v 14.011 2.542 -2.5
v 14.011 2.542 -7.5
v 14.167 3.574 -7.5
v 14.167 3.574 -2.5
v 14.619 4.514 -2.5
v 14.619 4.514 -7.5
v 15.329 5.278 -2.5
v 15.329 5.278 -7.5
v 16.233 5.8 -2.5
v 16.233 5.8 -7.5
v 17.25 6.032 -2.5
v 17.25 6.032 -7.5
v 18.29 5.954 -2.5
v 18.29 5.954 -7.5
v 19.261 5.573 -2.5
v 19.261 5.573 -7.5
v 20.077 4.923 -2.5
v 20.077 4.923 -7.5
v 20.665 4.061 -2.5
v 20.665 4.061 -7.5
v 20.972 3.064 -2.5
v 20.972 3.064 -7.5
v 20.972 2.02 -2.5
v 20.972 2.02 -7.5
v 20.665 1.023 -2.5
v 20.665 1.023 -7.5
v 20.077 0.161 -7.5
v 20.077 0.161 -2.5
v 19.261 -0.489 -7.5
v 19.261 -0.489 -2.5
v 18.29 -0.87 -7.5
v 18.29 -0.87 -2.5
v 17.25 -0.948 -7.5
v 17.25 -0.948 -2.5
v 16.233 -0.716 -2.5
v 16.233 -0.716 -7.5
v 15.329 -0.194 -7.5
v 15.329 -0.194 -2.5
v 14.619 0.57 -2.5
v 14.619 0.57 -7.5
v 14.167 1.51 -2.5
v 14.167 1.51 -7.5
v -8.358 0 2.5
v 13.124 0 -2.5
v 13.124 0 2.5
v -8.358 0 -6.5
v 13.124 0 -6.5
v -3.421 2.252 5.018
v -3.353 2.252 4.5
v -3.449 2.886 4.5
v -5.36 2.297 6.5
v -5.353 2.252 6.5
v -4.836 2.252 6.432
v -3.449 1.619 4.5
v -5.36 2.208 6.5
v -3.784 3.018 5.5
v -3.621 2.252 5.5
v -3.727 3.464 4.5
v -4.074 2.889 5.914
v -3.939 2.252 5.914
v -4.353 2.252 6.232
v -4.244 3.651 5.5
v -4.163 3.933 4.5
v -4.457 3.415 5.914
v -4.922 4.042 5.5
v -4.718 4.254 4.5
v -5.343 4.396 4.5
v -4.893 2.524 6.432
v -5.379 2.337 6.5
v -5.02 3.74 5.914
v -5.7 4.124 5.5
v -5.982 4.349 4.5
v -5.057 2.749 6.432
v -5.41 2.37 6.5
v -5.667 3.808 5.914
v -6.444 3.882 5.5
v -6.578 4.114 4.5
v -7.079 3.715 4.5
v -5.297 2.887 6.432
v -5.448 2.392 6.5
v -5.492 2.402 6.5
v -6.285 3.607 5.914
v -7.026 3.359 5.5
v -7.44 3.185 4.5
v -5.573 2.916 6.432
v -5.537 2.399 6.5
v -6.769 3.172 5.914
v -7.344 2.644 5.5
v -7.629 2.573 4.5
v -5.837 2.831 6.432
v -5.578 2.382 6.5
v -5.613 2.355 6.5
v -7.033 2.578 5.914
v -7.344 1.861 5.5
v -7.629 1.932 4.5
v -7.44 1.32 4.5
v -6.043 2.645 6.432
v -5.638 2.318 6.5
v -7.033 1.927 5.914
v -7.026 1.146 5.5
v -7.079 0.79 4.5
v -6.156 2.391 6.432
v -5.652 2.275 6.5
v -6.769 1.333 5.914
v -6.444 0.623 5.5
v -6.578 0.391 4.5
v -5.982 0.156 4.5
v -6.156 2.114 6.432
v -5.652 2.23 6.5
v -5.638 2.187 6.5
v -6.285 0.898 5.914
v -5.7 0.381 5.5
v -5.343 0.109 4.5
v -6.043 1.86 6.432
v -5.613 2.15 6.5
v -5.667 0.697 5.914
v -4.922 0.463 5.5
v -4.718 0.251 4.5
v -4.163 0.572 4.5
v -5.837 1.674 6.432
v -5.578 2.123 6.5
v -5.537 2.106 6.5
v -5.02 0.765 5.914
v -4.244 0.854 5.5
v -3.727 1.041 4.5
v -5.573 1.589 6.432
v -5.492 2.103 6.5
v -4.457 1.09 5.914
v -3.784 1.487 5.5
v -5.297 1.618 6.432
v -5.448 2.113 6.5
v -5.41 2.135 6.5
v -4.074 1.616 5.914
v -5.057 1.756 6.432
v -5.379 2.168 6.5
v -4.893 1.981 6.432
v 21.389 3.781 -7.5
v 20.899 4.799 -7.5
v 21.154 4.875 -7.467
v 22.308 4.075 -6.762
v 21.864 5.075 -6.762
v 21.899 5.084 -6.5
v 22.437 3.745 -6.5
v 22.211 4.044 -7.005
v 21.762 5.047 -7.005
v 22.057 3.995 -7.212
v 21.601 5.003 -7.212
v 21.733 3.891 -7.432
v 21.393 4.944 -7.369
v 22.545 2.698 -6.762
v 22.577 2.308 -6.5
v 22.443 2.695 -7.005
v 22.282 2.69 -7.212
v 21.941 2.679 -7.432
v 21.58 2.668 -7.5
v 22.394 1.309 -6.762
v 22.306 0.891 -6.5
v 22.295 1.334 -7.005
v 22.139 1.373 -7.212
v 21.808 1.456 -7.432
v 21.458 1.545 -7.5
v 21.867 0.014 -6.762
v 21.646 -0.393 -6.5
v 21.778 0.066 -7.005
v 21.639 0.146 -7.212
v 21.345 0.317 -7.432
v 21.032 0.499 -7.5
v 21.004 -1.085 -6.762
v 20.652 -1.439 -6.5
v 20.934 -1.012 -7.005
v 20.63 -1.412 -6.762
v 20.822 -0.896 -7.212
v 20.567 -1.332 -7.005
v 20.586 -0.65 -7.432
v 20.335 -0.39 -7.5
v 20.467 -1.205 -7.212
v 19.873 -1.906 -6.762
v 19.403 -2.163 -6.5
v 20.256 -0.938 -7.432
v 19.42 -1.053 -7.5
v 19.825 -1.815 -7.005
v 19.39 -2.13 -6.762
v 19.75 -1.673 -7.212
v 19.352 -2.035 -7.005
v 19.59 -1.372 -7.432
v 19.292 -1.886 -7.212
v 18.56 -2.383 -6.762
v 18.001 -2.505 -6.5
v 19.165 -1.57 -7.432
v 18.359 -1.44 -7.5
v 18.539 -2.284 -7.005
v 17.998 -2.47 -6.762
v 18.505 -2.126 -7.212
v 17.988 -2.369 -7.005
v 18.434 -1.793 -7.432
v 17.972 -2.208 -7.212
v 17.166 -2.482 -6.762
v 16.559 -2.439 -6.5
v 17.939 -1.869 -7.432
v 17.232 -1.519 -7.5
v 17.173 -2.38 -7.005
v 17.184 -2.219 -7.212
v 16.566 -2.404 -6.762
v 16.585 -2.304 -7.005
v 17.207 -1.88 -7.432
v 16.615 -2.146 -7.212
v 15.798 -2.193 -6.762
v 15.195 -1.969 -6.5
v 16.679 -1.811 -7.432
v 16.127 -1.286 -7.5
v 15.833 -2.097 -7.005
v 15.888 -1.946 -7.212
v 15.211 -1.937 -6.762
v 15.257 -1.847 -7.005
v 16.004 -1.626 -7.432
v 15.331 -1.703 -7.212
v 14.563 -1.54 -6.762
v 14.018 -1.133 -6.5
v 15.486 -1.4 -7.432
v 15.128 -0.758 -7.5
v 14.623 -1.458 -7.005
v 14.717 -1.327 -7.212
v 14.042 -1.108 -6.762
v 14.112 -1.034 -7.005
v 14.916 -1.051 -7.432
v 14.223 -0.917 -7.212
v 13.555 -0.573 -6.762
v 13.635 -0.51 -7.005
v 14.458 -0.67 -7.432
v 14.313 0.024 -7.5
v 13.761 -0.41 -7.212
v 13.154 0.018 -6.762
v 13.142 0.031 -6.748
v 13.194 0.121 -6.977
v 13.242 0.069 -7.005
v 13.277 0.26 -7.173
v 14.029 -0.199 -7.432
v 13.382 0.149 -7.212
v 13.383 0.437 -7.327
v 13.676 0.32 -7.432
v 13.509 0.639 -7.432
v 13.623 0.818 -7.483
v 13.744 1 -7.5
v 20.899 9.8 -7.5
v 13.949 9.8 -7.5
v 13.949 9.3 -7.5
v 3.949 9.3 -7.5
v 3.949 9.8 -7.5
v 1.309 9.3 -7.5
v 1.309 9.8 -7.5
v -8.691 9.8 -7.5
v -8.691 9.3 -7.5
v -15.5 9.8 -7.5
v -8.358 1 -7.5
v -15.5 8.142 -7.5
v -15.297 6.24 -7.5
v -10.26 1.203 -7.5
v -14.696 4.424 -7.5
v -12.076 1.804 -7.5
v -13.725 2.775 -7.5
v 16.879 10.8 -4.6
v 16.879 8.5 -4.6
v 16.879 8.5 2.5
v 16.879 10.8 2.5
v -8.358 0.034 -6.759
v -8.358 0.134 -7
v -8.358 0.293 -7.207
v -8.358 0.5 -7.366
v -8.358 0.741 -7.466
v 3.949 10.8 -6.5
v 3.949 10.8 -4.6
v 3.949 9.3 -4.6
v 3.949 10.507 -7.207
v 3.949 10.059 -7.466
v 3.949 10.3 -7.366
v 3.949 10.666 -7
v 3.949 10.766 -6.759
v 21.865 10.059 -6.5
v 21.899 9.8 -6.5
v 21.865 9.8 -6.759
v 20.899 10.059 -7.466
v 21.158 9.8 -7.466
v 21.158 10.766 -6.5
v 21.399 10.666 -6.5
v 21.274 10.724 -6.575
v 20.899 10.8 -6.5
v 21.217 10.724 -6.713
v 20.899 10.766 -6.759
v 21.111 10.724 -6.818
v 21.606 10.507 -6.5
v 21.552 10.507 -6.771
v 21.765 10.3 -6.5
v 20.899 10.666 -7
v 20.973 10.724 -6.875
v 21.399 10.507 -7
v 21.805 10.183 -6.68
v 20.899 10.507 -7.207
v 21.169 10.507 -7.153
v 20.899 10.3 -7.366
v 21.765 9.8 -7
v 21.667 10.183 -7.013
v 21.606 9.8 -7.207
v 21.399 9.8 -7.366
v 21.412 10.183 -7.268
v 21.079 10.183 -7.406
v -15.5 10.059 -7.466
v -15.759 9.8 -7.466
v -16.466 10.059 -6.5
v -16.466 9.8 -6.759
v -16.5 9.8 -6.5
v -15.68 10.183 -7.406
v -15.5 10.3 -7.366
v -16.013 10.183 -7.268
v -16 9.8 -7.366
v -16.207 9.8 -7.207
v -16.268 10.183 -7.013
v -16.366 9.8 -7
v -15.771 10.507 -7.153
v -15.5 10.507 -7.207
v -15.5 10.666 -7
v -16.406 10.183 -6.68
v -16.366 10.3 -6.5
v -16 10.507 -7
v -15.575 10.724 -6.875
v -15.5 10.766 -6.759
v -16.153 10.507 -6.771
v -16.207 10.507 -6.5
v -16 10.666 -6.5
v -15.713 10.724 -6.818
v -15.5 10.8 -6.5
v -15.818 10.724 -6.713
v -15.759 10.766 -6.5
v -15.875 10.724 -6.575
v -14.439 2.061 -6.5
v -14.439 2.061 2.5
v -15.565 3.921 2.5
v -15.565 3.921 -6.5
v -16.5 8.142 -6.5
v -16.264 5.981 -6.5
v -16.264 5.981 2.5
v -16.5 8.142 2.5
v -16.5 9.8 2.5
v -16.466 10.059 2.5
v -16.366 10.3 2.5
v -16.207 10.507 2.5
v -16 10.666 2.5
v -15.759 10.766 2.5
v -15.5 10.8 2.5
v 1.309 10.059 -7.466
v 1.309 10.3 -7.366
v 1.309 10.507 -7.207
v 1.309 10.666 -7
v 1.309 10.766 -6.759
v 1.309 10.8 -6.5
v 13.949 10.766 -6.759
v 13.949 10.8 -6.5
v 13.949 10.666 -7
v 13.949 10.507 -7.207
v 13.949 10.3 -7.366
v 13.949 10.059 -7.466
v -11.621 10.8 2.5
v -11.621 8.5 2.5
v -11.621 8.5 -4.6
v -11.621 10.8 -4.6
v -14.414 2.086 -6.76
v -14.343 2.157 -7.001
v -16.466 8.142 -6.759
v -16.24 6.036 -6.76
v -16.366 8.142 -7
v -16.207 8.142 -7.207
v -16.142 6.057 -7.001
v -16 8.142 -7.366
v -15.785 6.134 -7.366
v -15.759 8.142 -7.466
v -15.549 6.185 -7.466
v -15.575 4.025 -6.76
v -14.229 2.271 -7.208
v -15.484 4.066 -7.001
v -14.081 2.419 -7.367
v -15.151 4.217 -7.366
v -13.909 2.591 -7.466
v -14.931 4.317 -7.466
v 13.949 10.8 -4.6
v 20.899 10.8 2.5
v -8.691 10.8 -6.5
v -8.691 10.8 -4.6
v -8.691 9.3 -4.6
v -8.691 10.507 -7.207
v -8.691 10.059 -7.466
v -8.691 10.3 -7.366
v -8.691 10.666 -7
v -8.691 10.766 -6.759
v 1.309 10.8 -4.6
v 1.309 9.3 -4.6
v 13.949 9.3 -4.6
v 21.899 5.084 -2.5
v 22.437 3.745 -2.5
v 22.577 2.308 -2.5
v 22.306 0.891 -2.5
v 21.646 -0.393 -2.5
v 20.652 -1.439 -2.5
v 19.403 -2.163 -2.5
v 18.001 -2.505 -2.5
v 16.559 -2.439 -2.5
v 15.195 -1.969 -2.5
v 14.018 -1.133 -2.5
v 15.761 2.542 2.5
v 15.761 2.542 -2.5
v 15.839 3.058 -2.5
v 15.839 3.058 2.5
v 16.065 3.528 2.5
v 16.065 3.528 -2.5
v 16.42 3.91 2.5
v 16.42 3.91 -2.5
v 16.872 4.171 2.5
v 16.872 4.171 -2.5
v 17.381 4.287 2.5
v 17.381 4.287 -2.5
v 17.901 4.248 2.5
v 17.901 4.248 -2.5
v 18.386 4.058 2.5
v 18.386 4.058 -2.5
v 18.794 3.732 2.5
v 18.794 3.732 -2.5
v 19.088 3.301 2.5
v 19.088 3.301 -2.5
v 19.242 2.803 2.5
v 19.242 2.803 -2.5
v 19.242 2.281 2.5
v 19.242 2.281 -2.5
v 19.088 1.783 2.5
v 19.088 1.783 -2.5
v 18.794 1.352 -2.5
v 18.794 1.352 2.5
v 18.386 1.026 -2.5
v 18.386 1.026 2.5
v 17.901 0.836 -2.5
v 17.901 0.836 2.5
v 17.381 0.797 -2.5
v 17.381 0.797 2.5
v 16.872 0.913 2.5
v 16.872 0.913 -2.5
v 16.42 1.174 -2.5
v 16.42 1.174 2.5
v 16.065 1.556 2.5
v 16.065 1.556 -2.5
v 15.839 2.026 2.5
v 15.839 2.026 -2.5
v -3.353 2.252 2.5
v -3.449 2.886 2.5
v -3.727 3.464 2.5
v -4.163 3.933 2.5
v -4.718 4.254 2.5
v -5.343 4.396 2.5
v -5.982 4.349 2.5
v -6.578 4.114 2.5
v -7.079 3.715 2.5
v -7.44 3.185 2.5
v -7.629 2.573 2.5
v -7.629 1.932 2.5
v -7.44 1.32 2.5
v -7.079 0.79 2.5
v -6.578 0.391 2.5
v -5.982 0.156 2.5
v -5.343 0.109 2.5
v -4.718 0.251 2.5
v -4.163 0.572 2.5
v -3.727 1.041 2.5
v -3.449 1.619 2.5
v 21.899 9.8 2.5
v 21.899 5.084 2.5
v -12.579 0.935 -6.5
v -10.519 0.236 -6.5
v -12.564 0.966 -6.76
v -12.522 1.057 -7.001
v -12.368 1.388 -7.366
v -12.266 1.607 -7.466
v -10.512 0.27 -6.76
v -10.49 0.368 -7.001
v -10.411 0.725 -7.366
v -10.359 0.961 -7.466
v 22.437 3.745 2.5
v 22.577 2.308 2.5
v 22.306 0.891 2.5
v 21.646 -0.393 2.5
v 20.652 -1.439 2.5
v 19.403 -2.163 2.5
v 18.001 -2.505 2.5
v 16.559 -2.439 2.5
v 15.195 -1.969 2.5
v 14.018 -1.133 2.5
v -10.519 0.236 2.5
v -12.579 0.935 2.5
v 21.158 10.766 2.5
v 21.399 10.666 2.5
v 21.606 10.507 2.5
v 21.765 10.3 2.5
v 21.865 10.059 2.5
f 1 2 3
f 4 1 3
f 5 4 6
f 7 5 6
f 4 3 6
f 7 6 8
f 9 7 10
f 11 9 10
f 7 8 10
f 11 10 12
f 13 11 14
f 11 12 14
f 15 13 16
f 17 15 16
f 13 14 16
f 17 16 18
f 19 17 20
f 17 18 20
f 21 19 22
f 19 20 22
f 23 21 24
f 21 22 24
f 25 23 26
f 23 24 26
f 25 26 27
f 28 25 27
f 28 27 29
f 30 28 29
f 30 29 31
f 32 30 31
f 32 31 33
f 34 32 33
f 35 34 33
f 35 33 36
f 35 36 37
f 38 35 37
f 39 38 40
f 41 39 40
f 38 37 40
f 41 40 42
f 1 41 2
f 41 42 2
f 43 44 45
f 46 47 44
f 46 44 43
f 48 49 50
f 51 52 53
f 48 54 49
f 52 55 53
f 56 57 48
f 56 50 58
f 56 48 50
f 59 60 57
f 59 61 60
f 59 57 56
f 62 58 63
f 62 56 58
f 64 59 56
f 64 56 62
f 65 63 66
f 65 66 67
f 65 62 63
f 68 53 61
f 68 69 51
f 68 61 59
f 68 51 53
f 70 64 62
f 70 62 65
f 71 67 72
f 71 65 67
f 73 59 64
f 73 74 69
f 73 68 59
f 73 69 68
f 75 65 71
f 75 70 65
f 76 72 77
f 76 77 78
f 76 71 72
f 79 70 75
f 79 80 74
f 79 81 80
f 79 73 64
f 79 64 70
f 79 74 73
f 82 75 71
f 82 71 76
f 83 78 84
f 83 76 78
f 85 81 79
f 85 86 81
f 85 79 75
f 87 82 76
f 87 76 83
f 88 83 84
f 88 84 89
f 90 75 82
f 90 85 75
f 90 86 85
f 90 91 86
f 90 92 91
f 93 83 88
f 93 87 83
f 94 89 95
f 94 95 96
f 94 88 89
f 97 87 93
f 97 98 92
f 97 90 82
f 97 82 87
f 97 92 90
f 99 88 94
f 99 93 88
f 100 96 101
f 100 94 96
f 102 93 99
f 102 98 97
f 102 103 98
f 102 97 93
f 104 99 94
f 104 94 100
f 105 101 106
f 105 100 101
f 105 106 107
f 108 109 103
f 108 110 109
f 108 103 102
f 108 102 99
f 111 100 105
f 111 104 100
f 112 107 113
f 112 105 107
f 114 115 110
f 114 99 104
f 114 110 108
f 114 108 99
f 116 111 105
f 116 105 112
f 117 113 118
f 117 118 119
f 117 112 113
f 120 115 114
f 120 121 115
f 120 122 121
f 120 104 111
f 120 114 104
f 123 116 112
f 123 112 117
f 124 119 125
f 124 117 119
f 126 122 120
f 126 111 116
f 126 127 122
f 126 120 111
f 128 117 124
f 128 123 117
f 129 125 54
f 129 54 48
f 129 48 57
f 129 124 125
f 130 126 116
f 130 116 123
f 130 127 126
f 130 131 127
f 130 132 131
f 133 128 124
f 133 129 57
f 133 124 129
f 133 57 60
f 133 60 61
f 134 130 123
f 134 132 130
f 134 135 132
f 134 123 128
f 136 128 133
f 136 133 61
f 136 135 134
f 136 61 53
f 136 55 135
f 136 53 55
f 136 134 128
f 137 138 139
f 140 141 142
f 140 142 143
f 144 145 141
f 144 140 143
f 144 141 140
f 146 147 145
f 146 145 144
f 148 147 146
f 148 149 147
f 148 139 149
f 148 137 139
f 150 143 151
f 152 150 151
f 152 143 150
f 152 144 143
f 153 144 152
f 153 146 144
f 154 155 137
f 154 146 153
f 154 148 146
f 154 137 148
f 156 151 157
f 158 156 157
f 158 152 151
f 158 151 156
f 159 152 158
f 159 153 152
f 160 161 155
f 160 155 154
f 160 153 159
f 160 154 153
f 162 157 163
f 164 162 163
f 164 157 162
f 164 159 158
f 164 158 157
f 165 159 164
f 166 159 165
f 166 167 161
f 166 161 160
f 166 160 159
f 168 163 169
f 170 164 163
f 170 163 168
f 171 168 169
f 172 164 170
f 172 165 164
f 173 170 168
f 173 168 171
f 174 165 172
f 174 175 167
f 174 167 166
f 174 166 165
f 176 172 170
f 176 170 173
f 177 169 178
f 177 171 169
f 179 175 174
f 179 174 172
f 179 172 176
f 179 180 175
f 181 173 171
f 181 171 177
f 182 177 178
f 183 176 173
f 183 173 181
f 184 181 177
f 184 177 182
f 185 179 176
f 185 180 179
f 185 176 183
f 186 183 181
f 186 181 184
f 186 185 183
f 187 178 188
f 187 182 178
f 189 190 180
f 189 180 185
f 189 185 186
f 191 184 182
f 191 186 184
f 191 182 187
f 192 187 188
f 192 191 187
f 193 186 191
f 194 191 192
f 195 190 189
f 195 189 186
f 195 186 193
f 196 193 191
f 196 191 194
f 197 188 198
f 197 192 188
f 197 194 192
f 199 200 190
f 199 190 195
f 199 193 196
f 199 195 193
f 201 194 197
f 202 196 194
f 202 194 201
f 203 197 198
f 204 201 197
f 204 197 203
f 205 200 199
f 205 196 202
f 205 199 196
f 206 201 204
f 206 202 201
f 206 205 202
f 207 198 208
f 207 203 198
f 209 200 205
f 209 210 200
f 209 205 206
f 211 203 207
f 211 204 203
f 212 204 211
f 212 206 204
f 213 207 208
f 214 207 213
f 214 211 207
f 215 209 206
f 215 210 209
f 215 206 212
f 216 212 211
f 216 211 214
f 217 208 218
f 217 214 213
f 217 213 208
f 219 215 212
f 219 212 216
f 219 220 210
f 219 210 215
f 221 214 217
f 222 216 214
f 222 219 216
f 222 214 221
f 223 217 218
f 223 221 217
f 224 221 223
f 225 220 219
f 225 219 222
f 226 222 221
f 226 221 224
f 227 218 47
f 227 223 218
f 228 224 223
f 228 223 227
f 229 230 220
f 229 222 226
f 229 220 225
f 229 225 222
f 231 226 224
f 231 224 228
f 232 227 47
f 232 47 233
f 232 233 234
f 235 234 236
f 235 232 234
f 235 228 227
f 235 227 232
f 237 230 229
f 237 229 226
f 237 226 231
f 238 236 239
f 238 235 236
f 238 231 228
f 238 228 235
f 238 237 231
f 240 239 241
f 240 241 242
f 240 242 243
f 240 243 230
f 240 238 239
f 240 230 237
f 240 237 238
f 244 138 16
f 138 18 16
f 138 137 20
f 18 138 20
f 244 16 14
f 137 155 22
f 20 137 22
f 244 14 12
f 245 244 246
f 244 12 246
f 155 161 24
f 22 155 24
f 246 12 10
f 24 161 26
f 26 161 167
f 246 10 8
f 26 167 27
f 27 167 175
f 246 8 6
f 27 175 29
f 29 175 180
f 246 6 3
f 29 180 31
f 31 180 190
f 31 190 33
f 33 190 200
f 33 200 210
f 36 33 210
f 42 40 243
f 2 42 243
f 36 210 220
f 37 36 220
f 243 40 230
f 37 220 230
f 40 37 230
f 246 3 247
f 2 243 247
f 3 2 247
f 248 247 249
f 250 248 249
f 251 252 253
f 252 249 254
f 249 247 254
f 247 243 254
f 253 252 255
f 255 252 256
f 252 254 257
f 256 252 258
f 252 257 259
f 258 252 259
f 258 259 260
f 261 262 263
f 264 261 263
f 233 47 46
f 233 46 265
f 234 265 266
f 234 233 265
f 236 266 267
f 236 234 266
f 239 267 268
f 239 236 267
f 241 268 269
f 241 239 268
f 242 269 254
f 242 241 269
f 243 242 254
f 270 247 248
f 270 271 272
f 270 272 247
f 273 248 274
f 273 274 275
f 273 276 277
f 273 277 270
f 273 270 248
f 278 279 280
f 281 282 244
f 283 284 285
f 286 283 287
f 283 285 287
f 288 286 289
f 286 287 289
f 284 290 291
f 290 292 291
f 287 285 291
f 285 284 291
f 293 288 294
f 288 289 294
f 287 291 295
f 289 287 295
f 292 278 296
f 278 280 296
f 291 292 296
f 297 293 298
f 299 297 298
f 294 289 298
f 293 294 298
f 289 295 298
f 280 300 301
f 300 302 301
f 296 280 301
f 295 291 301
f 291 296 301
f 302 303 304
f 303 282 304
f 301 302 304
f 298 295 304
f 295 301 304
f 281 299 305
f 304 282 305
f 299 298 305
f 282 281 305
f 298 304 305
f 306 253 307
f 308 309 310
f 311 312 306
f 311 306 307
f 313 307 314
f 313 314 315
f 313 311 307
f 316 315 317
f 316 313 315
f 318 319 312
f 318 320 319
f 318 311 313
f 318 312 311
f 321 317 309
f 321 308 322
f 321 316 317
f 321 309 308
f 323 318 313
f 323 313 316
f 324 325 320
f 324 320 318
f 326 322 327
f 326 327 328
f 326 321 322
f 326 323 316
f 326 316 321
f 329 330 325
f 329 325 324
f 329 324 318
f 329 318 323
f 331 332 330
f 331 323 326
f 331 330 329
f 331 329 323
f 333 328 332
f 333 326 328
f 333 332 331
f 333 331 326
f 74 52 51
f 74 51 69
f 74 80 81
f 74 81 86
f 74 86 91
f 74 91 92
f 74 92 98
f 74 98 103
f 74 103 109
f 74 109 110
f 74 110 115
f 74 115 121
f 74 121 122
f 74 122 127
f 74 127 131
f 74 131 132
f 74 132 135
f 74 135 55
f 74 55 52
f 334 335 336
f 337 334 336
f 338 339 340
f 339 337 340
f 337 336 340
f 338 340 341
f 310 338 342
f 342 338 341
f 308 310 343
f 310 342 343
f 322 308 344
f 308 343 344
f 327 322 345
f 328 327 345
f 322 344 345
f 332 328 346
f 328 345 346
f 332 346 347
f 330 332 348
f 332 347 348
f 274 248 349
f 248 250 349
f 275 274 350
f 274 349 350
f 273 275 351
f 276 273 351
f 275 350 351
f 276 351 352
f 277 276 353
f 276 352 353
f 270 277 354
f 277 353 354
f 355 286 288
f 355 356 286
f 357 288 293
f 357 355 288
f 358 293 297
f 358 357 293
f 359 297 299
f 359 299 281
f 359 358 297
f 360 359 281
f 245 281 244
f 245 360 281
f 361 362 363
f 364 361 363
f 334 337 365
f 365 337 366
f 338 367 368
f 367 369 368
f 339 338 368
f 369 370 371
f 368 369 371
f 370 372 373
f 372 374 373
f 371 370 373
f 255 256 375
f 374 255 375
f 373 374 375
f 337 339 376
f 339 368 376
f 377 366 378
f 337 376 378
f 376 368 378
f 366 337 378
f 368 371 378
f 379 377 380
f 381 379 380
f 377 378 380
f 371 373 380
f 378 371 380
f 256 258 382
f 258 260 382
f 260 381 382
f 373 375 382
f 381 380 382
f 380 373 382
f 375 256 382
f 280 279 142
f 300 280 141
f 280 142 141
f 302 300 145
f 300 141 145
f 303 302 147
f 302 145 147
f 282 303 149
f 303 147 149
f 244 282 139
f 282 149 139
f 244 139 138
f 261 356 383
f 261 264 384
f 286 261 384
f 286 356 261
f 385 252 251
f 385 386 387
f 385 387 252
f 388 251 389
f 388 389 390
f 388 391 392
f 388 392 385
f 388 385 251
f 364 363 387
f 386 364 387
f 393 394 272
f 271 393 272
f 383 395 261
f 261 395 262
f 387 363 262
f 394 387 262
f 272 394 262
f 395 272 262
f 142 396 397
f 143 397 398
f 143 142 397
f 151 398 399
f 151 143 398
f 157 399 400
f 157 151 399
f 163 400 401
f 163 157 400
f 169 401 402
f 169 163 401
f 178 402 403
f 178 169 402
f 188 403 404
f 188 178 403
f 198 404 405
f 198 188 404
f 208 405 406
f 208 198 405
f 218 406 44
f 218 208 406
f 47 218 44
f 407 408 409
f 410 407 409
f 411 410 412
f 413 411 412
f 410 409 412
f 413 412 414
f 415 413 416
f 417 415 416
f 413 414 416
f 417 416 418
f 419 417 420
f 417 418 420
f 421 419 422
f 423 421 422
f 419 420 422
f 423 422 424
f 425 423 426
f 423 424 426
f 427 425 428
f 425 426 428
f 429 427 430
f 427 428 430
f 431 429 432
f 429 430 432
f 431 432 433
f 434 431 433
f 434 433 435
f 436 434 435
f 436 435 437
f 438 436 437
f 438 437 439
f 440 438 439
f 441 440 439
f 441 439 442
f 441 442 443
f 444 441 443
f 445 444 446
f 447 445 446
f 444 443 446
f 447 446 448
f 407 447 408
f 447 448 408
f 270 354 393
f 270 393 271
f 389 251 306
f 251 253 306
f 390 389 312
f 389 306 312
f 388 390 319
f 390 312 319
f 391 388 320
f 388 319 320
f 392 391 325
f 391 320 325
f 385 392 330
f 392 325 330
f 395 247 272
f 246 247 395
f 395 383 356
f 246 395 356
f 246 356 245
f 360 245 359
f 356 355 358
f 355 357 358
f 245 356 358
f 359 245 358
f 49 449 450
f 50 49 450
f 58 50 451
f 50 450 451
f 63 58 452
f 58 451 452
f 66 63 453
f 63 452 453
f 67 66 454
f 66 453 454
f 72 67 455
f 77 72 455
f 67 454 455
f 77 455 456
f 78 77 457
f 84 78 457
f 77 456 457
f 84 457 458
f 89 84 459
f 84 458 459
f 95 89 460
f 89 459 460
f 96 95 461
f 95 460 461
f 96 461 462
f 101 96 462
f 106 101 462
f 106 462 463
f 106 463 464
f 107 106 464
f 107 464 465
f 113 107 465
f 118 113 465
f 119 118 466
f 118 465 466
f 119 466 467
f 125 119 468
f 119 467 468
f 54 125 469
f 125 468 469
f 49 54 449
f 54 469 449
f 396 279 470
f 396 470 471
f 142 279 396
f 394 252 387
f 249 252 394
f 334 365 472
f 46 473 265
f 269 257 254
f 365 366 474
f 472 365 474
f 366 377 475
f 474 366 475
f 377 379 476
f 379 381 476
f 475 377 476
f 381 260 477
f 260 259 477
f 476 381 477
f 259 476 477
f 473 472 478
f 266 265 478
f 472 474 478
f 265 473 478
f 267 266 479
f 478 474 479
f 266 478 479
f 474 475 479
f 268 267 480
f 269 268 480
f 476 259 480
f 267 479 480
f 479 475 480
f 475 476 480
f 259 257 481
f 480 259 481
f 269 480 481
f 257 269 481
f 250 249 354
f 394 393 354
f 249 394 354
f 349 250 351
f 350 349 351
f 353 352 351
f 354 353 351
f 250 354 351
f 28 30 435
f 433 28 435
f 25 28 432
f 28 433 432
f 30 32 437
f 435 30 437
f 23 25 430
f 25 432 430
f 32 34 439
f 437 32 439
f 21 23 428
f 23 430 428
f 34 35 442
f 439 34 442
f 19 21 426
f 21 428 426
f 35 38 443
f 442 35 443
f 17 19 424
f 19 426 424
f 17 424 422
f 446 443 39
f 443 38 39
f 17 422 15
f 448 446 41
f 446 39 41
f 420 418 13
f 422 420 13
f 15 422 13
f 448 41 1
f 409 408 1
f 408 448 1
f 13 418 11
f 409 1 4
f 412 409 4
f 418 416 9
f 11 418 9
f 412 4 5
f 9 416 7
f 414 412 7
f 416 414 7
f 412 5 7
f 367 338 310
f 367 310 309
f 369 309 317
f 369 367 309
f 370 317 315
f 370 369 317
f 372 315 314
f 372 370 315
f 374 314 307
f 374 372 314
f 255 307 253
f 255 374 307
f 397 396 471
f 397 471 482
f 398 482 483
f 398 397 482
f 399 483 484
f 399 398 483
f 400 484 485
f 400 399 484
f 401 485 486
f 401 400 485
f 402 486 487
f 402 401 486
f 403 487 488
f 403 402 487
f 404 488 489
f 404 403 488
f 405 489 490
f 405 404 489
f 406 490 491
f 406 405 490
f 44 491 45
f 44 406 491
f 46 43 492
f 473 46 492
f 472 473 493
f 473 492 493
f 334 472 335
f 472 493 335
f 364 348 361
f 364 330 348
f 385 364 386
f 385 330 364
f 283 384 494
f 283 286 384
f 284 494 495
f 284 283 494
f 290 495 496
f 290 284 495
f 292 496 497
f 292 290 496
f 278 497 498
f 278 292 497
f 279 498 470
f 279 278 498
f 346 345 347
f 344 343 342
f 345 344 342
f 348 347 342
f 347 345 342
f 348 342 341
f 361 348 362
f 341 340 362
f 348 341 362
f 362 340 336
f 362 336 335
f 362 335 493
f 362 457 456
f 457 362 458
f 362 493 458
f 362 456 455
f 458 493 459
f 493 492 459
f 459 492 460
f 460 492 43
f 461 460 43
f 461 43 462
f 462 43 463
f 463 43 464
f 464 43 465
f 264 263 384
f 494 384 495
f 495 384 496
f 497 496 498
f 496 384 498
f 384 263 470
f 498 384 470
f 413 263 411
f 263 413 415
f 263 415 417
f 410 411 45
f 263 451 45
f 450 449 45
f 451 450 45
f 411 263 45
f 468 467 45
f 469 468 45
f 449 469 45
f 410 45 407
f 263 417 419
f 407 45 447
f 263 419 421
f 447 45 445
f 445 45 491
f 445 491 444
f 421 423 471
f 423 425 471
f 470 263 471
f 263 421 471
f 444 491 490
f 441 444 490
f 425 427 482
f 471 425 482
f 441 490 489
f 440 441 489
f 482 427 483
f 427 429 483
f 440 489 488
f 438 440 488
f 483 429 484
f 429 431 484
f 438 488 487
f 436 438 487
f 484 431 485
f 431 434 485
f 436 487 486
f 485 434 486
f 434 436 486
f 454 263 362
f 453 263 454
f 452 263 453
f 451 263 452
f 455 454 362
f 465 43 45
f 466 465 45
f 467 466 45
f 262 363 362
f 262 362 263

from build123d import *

# Parameters (mm, degrees)
CROQUIS1_W              = 33
CROQUIS1_H              = 5
SALIENTE_EXTRUIR1_DEPTH = 8.5
CROQUIS2_W              = 5
CROQUIS2_H              = 8.5
SALIENTE_EXTRUIR2_DEPTH = 14
CORTAR_EXTRUIR1_REACH   = 34.055
CROQUIS5_R              = 5.070689822
SALIENTE_EXTRUIR3_DEPTH = 5
CROQUIS6_R              = 1.75
CORTAR_EXTRUIR2_DEPTH   = 5
SALIENTE_EXTRUIR4_START = 5
CROQUIS7_R              = 3.5
SALIENTE_EXTRUIR4_DEPTH = 5
SALIENTE_EXTRUIR5_DEPTH = 2.3
CROQUIS9_W              = 10
CROQUIS9_H              = 2.9
CORTAR_EXTRUIR3_DEPTH   = 1.5
CHAFL_N1_SIZE           = 4
REDONDEO1_R             = 10
REDONDEO3_R             = 1
REDONDEO4_R             = 1
REDONDEO5_R             = 1
REDONDEO6_R             = 1
REDONDEO7_R             = 1
CROQUIS10_R             = 2.15
SALIENTE_EXTRUIR6_DEPTH = 4
REDONDEO8_R             = 2


with BuildPart() as part:
    # Croquis1 → Saliente-Extruir1 (new body)
    with BuildSketch(Plane(origin=(0, 0, 0), x_dir=(1, 0, 0), z_dir=(0, 1, 0))):
        Rectangle(CROQUIS1_W, CROQUIS1_H)
    extrude(amount=SALIENTE_EXTRUIR1_DEPTH)

    # Croquis2 → Saliente-Extruir2 (add)
    with BuildSketch(Plane(origin=(16.5, 0, 0), x_dir=(0, 0, -1), z_dir=(1, 0, 0))):
        with Locations((0, 4.25)):
            Rectangle(CROQUIS2_W, CROQUIS2_H)
    extrude(amount=SALIENTE_EXTRUIR2_DEPTH)

    # Croquis4 → Cortar-Extruir1 (cut, up to next)
    with BuildSketch(Plane(origin=(0, 0, -2.5), x_dir=(-1, 0, 0), z_dir=(0, 0, -1)), mode=Mode.PRIVATE) as cortar_extruir1_sk1:
        Polygon((-21.898835729, 8.5), (-21.898835729, 2.753380039), (-21.898835729, 0), (-30.5, 0), (-30.5, 8.5), align=None)
    cortar_extruir1_tool1 = extrude(cortar_extruir1_sk1.sketch, amount=-CORTAR_EXTRUIR1_REACH, mode=Mode.PRIVATE) & part.part
    add(cortar_extruir1_tool1.solids().sort_by_distance((26.199418, 4.25, -2.5))[0], mode=Mode.SUBTRACT)

    # Croquis5 → Saliente-Extruir3 (add)
    with BuildSketch(Plane(origin=(0, 0, -2.5), x_dir=(-1, 0, 0), z_dir=(0, 0, -1))):
        with Locations((-17.511321809, 2.541971061)):
            Circle(CROQUIS5_R)
    extrude(amount=-SALIENTE_EXTRUIR3_DEPTH)

    # Croquis6 → Cortar-Extruir2 (cut)
    with BuildSketch(Plane(origin=(0, 0, -2.5), x_dir=(-1, 0, 0), z_dir=(0, 0, -1))):
        with Locations((-17.511321809, 2.541971061)):
            Circle(CROQUIS6_R)
    extrude(amount=-CORTAR_EXTRUIR2_DEPTH, mode=Mode.SUBTRACT)

    # Croquis7 → Saliente-Extruir4 (add)
    with BuildSketch(Plane(origin=(0, 0, -2.5), x_dir=(-1, 0, 0), z_dir=(0, 0, -1)).offset(SALIENTE_EXTRUIR4_START)):
        with BuildLine():
            Line((-21.898835729, 8.5), (-21.898835729, 5.083942123))
            ThreePointArc((-21.898835729, 5.083942123), (-20.05329287, -1.845542858), (-13.123807889, 0))
            Line((-13.123807889, 0), (16.5, 0))
            Line((16.5, 0), (16.5, 8.5))
            Line((16.5, 8.5), (-21.898835729, 8.5))
        make_face()
        with Locations((-17.511321809, 2.541971061)):
            Circle(CROQUIS7_R, mode=Mode.SUBTRACT)
    extrude(amount=-SALIENTE_EXTRUIR4_DEPTH)

    # Croquis8 → Saliente-Extruir5 (add)
    with BuildSketch(Plane(origin=(0, 8.5, 0), x_dir=(1, 0, 0), z_dir=(0, 1, 0))):
        Polygon((-16.5, -2.5), (-11.620504371, -2.5), (-11.620504371, -2.1), (-11.620504371, 4.6), (16.879495629, 4.6), (16.879495629, -2.1), (16.879495629, -2.5), (21.898835729, -2.5), (21.898835729, 7.5), (-16.5, 7.5), align=None)
    extrude(amount=SALIENTE_EXTRUIR5_DEPTH)

    # Croquis9 → Cortar-Extruir3 (cut)
    with BuildSketch(Plane(origin=(0, 10.8, 0), x_dir=(1, 0, 0), z_dir=(0, 1, 0))):
        with Locations((8.949495629, 6.05)):
            Rectangle(CROQUIS9_W, CROQUIS9_H)
        with Locations((-3.690504371, 6.05)):
            Rectangle(CROQUIS9_W, CROQUIS9_H)
    extrude(amount=-CORTAR_EXTRUIR3_DEPTH, mode=Mode.SUBTRACT)

    # Chaflán1
    chafl_n1_edges = [part.edges().sort_by_distance(p)[0] for p in [
        (-16.5, 0, -2.5),
    ]]
    chamfer(chafl_n1_edges, length=CHAFL_N1_SIZE)

    # Redondeo1
    # the kernel refuses this fillet: 10 mm, written as the material it takes off along each edge
    with BuildSketch(Plane(origin=(-12.5, 0, 12.855339059), x_dir=(-0.7071067811865476, 0.7071067811865477, 0), z_dir=(0, 0, -1)), Plane(origin=(-16.5, 4, 12.855339059), x_dir=(0, 1, 0), z_dir=(0, 0, -1))) as redondeo1_piece_1:
        with BuildLine():
            CenterArc((REDONDEO1_R * 0.414213562373, REDONDEO1_R), REDONDEO1_R, 225, 45)
            Line((-REDONDEO1_R * 0.292893218813, REDONDEO1_R * 0.292893218813), (0, 0))
            Line((0, 0), (REDONDEO1_R * 0.414213562373, 0))
        make_face()
    extrude(amount=30.710678119, mode=Mode.SUBTRACT)

    # Redondeo3
    redondeo3_edges = [part.edges().sort_by_distance(p)[0] for p in [
        (-16.5, 9.471067812, -7.5),
        (-15.970669758, 4.931775157, -7.5),
        (-11.568224843, 0.529330242, -7.5),
        (2.382971757, 0, -7.5),
    ]]
    fillet(redondeo3_edges, radius=REDONDEO3_R)

    # Redondeo4
    redondeo4_edges = [part.edges().sort_by_distance(p)[0] for p in [
        (19.565273177, -2.094102606, -7.5),
        (21.898835729, 7.941971061, -7.5),
    ]]
    fillet(redondeo4_edges, radius=REDONDEO4_R)

    # Redondeo5
    redondeo5_edges = [part.edges().sort_by_distance(p)[0] for p in [
        (17.424165679, 10.8, -7.5),
        (21.60594251, 10.8, -7.207106781),
        (21.898835729, 10.8, -2),
    ]]
    fillet(redondeo5_edges, radius=REDONDEO5_R)

    # Redondeo6
    redondeo6_edges = [part.edges().sort_by_distance(p)[0] for p in [
        (-12.095252185, 10.8, -7.5),
        (-16.5, 10.8, -2),
        (-16.207106781, 10.8, -7.207106781),
    ]]
    fillet(redondeo6_edges, radius=REDONDEO6_R)

    # Redondeo7
    redondeo7_edges = [part.edges().sort_by_distance(p)[0] for p in [
        (2.629495629, 10.8, -7.5),
    ]]
    fillet(redondeo7_edges, radius=REDONDEO7_R)

    # Croquis10 → Saliente-Extruir6 (add)
    with BuildSketch(Plane.XY.offset(2.5)):
        with Locations((-5.503268941, 2.252495098)):
            Circle(CROQUIS10_R)
    extrude(amount=SALIENTE_EXTRUIR6_DEPTH)

    # Redondeo8
    redondeo8_edges = [part.edges().sort_by_distance(p)[0] for p in [
        (-7.653268941, 2.252495098, 6.5),
    ]]
    fillet(redondeo8_edges, radius=REDONDEO8_R)


solid = part.part
